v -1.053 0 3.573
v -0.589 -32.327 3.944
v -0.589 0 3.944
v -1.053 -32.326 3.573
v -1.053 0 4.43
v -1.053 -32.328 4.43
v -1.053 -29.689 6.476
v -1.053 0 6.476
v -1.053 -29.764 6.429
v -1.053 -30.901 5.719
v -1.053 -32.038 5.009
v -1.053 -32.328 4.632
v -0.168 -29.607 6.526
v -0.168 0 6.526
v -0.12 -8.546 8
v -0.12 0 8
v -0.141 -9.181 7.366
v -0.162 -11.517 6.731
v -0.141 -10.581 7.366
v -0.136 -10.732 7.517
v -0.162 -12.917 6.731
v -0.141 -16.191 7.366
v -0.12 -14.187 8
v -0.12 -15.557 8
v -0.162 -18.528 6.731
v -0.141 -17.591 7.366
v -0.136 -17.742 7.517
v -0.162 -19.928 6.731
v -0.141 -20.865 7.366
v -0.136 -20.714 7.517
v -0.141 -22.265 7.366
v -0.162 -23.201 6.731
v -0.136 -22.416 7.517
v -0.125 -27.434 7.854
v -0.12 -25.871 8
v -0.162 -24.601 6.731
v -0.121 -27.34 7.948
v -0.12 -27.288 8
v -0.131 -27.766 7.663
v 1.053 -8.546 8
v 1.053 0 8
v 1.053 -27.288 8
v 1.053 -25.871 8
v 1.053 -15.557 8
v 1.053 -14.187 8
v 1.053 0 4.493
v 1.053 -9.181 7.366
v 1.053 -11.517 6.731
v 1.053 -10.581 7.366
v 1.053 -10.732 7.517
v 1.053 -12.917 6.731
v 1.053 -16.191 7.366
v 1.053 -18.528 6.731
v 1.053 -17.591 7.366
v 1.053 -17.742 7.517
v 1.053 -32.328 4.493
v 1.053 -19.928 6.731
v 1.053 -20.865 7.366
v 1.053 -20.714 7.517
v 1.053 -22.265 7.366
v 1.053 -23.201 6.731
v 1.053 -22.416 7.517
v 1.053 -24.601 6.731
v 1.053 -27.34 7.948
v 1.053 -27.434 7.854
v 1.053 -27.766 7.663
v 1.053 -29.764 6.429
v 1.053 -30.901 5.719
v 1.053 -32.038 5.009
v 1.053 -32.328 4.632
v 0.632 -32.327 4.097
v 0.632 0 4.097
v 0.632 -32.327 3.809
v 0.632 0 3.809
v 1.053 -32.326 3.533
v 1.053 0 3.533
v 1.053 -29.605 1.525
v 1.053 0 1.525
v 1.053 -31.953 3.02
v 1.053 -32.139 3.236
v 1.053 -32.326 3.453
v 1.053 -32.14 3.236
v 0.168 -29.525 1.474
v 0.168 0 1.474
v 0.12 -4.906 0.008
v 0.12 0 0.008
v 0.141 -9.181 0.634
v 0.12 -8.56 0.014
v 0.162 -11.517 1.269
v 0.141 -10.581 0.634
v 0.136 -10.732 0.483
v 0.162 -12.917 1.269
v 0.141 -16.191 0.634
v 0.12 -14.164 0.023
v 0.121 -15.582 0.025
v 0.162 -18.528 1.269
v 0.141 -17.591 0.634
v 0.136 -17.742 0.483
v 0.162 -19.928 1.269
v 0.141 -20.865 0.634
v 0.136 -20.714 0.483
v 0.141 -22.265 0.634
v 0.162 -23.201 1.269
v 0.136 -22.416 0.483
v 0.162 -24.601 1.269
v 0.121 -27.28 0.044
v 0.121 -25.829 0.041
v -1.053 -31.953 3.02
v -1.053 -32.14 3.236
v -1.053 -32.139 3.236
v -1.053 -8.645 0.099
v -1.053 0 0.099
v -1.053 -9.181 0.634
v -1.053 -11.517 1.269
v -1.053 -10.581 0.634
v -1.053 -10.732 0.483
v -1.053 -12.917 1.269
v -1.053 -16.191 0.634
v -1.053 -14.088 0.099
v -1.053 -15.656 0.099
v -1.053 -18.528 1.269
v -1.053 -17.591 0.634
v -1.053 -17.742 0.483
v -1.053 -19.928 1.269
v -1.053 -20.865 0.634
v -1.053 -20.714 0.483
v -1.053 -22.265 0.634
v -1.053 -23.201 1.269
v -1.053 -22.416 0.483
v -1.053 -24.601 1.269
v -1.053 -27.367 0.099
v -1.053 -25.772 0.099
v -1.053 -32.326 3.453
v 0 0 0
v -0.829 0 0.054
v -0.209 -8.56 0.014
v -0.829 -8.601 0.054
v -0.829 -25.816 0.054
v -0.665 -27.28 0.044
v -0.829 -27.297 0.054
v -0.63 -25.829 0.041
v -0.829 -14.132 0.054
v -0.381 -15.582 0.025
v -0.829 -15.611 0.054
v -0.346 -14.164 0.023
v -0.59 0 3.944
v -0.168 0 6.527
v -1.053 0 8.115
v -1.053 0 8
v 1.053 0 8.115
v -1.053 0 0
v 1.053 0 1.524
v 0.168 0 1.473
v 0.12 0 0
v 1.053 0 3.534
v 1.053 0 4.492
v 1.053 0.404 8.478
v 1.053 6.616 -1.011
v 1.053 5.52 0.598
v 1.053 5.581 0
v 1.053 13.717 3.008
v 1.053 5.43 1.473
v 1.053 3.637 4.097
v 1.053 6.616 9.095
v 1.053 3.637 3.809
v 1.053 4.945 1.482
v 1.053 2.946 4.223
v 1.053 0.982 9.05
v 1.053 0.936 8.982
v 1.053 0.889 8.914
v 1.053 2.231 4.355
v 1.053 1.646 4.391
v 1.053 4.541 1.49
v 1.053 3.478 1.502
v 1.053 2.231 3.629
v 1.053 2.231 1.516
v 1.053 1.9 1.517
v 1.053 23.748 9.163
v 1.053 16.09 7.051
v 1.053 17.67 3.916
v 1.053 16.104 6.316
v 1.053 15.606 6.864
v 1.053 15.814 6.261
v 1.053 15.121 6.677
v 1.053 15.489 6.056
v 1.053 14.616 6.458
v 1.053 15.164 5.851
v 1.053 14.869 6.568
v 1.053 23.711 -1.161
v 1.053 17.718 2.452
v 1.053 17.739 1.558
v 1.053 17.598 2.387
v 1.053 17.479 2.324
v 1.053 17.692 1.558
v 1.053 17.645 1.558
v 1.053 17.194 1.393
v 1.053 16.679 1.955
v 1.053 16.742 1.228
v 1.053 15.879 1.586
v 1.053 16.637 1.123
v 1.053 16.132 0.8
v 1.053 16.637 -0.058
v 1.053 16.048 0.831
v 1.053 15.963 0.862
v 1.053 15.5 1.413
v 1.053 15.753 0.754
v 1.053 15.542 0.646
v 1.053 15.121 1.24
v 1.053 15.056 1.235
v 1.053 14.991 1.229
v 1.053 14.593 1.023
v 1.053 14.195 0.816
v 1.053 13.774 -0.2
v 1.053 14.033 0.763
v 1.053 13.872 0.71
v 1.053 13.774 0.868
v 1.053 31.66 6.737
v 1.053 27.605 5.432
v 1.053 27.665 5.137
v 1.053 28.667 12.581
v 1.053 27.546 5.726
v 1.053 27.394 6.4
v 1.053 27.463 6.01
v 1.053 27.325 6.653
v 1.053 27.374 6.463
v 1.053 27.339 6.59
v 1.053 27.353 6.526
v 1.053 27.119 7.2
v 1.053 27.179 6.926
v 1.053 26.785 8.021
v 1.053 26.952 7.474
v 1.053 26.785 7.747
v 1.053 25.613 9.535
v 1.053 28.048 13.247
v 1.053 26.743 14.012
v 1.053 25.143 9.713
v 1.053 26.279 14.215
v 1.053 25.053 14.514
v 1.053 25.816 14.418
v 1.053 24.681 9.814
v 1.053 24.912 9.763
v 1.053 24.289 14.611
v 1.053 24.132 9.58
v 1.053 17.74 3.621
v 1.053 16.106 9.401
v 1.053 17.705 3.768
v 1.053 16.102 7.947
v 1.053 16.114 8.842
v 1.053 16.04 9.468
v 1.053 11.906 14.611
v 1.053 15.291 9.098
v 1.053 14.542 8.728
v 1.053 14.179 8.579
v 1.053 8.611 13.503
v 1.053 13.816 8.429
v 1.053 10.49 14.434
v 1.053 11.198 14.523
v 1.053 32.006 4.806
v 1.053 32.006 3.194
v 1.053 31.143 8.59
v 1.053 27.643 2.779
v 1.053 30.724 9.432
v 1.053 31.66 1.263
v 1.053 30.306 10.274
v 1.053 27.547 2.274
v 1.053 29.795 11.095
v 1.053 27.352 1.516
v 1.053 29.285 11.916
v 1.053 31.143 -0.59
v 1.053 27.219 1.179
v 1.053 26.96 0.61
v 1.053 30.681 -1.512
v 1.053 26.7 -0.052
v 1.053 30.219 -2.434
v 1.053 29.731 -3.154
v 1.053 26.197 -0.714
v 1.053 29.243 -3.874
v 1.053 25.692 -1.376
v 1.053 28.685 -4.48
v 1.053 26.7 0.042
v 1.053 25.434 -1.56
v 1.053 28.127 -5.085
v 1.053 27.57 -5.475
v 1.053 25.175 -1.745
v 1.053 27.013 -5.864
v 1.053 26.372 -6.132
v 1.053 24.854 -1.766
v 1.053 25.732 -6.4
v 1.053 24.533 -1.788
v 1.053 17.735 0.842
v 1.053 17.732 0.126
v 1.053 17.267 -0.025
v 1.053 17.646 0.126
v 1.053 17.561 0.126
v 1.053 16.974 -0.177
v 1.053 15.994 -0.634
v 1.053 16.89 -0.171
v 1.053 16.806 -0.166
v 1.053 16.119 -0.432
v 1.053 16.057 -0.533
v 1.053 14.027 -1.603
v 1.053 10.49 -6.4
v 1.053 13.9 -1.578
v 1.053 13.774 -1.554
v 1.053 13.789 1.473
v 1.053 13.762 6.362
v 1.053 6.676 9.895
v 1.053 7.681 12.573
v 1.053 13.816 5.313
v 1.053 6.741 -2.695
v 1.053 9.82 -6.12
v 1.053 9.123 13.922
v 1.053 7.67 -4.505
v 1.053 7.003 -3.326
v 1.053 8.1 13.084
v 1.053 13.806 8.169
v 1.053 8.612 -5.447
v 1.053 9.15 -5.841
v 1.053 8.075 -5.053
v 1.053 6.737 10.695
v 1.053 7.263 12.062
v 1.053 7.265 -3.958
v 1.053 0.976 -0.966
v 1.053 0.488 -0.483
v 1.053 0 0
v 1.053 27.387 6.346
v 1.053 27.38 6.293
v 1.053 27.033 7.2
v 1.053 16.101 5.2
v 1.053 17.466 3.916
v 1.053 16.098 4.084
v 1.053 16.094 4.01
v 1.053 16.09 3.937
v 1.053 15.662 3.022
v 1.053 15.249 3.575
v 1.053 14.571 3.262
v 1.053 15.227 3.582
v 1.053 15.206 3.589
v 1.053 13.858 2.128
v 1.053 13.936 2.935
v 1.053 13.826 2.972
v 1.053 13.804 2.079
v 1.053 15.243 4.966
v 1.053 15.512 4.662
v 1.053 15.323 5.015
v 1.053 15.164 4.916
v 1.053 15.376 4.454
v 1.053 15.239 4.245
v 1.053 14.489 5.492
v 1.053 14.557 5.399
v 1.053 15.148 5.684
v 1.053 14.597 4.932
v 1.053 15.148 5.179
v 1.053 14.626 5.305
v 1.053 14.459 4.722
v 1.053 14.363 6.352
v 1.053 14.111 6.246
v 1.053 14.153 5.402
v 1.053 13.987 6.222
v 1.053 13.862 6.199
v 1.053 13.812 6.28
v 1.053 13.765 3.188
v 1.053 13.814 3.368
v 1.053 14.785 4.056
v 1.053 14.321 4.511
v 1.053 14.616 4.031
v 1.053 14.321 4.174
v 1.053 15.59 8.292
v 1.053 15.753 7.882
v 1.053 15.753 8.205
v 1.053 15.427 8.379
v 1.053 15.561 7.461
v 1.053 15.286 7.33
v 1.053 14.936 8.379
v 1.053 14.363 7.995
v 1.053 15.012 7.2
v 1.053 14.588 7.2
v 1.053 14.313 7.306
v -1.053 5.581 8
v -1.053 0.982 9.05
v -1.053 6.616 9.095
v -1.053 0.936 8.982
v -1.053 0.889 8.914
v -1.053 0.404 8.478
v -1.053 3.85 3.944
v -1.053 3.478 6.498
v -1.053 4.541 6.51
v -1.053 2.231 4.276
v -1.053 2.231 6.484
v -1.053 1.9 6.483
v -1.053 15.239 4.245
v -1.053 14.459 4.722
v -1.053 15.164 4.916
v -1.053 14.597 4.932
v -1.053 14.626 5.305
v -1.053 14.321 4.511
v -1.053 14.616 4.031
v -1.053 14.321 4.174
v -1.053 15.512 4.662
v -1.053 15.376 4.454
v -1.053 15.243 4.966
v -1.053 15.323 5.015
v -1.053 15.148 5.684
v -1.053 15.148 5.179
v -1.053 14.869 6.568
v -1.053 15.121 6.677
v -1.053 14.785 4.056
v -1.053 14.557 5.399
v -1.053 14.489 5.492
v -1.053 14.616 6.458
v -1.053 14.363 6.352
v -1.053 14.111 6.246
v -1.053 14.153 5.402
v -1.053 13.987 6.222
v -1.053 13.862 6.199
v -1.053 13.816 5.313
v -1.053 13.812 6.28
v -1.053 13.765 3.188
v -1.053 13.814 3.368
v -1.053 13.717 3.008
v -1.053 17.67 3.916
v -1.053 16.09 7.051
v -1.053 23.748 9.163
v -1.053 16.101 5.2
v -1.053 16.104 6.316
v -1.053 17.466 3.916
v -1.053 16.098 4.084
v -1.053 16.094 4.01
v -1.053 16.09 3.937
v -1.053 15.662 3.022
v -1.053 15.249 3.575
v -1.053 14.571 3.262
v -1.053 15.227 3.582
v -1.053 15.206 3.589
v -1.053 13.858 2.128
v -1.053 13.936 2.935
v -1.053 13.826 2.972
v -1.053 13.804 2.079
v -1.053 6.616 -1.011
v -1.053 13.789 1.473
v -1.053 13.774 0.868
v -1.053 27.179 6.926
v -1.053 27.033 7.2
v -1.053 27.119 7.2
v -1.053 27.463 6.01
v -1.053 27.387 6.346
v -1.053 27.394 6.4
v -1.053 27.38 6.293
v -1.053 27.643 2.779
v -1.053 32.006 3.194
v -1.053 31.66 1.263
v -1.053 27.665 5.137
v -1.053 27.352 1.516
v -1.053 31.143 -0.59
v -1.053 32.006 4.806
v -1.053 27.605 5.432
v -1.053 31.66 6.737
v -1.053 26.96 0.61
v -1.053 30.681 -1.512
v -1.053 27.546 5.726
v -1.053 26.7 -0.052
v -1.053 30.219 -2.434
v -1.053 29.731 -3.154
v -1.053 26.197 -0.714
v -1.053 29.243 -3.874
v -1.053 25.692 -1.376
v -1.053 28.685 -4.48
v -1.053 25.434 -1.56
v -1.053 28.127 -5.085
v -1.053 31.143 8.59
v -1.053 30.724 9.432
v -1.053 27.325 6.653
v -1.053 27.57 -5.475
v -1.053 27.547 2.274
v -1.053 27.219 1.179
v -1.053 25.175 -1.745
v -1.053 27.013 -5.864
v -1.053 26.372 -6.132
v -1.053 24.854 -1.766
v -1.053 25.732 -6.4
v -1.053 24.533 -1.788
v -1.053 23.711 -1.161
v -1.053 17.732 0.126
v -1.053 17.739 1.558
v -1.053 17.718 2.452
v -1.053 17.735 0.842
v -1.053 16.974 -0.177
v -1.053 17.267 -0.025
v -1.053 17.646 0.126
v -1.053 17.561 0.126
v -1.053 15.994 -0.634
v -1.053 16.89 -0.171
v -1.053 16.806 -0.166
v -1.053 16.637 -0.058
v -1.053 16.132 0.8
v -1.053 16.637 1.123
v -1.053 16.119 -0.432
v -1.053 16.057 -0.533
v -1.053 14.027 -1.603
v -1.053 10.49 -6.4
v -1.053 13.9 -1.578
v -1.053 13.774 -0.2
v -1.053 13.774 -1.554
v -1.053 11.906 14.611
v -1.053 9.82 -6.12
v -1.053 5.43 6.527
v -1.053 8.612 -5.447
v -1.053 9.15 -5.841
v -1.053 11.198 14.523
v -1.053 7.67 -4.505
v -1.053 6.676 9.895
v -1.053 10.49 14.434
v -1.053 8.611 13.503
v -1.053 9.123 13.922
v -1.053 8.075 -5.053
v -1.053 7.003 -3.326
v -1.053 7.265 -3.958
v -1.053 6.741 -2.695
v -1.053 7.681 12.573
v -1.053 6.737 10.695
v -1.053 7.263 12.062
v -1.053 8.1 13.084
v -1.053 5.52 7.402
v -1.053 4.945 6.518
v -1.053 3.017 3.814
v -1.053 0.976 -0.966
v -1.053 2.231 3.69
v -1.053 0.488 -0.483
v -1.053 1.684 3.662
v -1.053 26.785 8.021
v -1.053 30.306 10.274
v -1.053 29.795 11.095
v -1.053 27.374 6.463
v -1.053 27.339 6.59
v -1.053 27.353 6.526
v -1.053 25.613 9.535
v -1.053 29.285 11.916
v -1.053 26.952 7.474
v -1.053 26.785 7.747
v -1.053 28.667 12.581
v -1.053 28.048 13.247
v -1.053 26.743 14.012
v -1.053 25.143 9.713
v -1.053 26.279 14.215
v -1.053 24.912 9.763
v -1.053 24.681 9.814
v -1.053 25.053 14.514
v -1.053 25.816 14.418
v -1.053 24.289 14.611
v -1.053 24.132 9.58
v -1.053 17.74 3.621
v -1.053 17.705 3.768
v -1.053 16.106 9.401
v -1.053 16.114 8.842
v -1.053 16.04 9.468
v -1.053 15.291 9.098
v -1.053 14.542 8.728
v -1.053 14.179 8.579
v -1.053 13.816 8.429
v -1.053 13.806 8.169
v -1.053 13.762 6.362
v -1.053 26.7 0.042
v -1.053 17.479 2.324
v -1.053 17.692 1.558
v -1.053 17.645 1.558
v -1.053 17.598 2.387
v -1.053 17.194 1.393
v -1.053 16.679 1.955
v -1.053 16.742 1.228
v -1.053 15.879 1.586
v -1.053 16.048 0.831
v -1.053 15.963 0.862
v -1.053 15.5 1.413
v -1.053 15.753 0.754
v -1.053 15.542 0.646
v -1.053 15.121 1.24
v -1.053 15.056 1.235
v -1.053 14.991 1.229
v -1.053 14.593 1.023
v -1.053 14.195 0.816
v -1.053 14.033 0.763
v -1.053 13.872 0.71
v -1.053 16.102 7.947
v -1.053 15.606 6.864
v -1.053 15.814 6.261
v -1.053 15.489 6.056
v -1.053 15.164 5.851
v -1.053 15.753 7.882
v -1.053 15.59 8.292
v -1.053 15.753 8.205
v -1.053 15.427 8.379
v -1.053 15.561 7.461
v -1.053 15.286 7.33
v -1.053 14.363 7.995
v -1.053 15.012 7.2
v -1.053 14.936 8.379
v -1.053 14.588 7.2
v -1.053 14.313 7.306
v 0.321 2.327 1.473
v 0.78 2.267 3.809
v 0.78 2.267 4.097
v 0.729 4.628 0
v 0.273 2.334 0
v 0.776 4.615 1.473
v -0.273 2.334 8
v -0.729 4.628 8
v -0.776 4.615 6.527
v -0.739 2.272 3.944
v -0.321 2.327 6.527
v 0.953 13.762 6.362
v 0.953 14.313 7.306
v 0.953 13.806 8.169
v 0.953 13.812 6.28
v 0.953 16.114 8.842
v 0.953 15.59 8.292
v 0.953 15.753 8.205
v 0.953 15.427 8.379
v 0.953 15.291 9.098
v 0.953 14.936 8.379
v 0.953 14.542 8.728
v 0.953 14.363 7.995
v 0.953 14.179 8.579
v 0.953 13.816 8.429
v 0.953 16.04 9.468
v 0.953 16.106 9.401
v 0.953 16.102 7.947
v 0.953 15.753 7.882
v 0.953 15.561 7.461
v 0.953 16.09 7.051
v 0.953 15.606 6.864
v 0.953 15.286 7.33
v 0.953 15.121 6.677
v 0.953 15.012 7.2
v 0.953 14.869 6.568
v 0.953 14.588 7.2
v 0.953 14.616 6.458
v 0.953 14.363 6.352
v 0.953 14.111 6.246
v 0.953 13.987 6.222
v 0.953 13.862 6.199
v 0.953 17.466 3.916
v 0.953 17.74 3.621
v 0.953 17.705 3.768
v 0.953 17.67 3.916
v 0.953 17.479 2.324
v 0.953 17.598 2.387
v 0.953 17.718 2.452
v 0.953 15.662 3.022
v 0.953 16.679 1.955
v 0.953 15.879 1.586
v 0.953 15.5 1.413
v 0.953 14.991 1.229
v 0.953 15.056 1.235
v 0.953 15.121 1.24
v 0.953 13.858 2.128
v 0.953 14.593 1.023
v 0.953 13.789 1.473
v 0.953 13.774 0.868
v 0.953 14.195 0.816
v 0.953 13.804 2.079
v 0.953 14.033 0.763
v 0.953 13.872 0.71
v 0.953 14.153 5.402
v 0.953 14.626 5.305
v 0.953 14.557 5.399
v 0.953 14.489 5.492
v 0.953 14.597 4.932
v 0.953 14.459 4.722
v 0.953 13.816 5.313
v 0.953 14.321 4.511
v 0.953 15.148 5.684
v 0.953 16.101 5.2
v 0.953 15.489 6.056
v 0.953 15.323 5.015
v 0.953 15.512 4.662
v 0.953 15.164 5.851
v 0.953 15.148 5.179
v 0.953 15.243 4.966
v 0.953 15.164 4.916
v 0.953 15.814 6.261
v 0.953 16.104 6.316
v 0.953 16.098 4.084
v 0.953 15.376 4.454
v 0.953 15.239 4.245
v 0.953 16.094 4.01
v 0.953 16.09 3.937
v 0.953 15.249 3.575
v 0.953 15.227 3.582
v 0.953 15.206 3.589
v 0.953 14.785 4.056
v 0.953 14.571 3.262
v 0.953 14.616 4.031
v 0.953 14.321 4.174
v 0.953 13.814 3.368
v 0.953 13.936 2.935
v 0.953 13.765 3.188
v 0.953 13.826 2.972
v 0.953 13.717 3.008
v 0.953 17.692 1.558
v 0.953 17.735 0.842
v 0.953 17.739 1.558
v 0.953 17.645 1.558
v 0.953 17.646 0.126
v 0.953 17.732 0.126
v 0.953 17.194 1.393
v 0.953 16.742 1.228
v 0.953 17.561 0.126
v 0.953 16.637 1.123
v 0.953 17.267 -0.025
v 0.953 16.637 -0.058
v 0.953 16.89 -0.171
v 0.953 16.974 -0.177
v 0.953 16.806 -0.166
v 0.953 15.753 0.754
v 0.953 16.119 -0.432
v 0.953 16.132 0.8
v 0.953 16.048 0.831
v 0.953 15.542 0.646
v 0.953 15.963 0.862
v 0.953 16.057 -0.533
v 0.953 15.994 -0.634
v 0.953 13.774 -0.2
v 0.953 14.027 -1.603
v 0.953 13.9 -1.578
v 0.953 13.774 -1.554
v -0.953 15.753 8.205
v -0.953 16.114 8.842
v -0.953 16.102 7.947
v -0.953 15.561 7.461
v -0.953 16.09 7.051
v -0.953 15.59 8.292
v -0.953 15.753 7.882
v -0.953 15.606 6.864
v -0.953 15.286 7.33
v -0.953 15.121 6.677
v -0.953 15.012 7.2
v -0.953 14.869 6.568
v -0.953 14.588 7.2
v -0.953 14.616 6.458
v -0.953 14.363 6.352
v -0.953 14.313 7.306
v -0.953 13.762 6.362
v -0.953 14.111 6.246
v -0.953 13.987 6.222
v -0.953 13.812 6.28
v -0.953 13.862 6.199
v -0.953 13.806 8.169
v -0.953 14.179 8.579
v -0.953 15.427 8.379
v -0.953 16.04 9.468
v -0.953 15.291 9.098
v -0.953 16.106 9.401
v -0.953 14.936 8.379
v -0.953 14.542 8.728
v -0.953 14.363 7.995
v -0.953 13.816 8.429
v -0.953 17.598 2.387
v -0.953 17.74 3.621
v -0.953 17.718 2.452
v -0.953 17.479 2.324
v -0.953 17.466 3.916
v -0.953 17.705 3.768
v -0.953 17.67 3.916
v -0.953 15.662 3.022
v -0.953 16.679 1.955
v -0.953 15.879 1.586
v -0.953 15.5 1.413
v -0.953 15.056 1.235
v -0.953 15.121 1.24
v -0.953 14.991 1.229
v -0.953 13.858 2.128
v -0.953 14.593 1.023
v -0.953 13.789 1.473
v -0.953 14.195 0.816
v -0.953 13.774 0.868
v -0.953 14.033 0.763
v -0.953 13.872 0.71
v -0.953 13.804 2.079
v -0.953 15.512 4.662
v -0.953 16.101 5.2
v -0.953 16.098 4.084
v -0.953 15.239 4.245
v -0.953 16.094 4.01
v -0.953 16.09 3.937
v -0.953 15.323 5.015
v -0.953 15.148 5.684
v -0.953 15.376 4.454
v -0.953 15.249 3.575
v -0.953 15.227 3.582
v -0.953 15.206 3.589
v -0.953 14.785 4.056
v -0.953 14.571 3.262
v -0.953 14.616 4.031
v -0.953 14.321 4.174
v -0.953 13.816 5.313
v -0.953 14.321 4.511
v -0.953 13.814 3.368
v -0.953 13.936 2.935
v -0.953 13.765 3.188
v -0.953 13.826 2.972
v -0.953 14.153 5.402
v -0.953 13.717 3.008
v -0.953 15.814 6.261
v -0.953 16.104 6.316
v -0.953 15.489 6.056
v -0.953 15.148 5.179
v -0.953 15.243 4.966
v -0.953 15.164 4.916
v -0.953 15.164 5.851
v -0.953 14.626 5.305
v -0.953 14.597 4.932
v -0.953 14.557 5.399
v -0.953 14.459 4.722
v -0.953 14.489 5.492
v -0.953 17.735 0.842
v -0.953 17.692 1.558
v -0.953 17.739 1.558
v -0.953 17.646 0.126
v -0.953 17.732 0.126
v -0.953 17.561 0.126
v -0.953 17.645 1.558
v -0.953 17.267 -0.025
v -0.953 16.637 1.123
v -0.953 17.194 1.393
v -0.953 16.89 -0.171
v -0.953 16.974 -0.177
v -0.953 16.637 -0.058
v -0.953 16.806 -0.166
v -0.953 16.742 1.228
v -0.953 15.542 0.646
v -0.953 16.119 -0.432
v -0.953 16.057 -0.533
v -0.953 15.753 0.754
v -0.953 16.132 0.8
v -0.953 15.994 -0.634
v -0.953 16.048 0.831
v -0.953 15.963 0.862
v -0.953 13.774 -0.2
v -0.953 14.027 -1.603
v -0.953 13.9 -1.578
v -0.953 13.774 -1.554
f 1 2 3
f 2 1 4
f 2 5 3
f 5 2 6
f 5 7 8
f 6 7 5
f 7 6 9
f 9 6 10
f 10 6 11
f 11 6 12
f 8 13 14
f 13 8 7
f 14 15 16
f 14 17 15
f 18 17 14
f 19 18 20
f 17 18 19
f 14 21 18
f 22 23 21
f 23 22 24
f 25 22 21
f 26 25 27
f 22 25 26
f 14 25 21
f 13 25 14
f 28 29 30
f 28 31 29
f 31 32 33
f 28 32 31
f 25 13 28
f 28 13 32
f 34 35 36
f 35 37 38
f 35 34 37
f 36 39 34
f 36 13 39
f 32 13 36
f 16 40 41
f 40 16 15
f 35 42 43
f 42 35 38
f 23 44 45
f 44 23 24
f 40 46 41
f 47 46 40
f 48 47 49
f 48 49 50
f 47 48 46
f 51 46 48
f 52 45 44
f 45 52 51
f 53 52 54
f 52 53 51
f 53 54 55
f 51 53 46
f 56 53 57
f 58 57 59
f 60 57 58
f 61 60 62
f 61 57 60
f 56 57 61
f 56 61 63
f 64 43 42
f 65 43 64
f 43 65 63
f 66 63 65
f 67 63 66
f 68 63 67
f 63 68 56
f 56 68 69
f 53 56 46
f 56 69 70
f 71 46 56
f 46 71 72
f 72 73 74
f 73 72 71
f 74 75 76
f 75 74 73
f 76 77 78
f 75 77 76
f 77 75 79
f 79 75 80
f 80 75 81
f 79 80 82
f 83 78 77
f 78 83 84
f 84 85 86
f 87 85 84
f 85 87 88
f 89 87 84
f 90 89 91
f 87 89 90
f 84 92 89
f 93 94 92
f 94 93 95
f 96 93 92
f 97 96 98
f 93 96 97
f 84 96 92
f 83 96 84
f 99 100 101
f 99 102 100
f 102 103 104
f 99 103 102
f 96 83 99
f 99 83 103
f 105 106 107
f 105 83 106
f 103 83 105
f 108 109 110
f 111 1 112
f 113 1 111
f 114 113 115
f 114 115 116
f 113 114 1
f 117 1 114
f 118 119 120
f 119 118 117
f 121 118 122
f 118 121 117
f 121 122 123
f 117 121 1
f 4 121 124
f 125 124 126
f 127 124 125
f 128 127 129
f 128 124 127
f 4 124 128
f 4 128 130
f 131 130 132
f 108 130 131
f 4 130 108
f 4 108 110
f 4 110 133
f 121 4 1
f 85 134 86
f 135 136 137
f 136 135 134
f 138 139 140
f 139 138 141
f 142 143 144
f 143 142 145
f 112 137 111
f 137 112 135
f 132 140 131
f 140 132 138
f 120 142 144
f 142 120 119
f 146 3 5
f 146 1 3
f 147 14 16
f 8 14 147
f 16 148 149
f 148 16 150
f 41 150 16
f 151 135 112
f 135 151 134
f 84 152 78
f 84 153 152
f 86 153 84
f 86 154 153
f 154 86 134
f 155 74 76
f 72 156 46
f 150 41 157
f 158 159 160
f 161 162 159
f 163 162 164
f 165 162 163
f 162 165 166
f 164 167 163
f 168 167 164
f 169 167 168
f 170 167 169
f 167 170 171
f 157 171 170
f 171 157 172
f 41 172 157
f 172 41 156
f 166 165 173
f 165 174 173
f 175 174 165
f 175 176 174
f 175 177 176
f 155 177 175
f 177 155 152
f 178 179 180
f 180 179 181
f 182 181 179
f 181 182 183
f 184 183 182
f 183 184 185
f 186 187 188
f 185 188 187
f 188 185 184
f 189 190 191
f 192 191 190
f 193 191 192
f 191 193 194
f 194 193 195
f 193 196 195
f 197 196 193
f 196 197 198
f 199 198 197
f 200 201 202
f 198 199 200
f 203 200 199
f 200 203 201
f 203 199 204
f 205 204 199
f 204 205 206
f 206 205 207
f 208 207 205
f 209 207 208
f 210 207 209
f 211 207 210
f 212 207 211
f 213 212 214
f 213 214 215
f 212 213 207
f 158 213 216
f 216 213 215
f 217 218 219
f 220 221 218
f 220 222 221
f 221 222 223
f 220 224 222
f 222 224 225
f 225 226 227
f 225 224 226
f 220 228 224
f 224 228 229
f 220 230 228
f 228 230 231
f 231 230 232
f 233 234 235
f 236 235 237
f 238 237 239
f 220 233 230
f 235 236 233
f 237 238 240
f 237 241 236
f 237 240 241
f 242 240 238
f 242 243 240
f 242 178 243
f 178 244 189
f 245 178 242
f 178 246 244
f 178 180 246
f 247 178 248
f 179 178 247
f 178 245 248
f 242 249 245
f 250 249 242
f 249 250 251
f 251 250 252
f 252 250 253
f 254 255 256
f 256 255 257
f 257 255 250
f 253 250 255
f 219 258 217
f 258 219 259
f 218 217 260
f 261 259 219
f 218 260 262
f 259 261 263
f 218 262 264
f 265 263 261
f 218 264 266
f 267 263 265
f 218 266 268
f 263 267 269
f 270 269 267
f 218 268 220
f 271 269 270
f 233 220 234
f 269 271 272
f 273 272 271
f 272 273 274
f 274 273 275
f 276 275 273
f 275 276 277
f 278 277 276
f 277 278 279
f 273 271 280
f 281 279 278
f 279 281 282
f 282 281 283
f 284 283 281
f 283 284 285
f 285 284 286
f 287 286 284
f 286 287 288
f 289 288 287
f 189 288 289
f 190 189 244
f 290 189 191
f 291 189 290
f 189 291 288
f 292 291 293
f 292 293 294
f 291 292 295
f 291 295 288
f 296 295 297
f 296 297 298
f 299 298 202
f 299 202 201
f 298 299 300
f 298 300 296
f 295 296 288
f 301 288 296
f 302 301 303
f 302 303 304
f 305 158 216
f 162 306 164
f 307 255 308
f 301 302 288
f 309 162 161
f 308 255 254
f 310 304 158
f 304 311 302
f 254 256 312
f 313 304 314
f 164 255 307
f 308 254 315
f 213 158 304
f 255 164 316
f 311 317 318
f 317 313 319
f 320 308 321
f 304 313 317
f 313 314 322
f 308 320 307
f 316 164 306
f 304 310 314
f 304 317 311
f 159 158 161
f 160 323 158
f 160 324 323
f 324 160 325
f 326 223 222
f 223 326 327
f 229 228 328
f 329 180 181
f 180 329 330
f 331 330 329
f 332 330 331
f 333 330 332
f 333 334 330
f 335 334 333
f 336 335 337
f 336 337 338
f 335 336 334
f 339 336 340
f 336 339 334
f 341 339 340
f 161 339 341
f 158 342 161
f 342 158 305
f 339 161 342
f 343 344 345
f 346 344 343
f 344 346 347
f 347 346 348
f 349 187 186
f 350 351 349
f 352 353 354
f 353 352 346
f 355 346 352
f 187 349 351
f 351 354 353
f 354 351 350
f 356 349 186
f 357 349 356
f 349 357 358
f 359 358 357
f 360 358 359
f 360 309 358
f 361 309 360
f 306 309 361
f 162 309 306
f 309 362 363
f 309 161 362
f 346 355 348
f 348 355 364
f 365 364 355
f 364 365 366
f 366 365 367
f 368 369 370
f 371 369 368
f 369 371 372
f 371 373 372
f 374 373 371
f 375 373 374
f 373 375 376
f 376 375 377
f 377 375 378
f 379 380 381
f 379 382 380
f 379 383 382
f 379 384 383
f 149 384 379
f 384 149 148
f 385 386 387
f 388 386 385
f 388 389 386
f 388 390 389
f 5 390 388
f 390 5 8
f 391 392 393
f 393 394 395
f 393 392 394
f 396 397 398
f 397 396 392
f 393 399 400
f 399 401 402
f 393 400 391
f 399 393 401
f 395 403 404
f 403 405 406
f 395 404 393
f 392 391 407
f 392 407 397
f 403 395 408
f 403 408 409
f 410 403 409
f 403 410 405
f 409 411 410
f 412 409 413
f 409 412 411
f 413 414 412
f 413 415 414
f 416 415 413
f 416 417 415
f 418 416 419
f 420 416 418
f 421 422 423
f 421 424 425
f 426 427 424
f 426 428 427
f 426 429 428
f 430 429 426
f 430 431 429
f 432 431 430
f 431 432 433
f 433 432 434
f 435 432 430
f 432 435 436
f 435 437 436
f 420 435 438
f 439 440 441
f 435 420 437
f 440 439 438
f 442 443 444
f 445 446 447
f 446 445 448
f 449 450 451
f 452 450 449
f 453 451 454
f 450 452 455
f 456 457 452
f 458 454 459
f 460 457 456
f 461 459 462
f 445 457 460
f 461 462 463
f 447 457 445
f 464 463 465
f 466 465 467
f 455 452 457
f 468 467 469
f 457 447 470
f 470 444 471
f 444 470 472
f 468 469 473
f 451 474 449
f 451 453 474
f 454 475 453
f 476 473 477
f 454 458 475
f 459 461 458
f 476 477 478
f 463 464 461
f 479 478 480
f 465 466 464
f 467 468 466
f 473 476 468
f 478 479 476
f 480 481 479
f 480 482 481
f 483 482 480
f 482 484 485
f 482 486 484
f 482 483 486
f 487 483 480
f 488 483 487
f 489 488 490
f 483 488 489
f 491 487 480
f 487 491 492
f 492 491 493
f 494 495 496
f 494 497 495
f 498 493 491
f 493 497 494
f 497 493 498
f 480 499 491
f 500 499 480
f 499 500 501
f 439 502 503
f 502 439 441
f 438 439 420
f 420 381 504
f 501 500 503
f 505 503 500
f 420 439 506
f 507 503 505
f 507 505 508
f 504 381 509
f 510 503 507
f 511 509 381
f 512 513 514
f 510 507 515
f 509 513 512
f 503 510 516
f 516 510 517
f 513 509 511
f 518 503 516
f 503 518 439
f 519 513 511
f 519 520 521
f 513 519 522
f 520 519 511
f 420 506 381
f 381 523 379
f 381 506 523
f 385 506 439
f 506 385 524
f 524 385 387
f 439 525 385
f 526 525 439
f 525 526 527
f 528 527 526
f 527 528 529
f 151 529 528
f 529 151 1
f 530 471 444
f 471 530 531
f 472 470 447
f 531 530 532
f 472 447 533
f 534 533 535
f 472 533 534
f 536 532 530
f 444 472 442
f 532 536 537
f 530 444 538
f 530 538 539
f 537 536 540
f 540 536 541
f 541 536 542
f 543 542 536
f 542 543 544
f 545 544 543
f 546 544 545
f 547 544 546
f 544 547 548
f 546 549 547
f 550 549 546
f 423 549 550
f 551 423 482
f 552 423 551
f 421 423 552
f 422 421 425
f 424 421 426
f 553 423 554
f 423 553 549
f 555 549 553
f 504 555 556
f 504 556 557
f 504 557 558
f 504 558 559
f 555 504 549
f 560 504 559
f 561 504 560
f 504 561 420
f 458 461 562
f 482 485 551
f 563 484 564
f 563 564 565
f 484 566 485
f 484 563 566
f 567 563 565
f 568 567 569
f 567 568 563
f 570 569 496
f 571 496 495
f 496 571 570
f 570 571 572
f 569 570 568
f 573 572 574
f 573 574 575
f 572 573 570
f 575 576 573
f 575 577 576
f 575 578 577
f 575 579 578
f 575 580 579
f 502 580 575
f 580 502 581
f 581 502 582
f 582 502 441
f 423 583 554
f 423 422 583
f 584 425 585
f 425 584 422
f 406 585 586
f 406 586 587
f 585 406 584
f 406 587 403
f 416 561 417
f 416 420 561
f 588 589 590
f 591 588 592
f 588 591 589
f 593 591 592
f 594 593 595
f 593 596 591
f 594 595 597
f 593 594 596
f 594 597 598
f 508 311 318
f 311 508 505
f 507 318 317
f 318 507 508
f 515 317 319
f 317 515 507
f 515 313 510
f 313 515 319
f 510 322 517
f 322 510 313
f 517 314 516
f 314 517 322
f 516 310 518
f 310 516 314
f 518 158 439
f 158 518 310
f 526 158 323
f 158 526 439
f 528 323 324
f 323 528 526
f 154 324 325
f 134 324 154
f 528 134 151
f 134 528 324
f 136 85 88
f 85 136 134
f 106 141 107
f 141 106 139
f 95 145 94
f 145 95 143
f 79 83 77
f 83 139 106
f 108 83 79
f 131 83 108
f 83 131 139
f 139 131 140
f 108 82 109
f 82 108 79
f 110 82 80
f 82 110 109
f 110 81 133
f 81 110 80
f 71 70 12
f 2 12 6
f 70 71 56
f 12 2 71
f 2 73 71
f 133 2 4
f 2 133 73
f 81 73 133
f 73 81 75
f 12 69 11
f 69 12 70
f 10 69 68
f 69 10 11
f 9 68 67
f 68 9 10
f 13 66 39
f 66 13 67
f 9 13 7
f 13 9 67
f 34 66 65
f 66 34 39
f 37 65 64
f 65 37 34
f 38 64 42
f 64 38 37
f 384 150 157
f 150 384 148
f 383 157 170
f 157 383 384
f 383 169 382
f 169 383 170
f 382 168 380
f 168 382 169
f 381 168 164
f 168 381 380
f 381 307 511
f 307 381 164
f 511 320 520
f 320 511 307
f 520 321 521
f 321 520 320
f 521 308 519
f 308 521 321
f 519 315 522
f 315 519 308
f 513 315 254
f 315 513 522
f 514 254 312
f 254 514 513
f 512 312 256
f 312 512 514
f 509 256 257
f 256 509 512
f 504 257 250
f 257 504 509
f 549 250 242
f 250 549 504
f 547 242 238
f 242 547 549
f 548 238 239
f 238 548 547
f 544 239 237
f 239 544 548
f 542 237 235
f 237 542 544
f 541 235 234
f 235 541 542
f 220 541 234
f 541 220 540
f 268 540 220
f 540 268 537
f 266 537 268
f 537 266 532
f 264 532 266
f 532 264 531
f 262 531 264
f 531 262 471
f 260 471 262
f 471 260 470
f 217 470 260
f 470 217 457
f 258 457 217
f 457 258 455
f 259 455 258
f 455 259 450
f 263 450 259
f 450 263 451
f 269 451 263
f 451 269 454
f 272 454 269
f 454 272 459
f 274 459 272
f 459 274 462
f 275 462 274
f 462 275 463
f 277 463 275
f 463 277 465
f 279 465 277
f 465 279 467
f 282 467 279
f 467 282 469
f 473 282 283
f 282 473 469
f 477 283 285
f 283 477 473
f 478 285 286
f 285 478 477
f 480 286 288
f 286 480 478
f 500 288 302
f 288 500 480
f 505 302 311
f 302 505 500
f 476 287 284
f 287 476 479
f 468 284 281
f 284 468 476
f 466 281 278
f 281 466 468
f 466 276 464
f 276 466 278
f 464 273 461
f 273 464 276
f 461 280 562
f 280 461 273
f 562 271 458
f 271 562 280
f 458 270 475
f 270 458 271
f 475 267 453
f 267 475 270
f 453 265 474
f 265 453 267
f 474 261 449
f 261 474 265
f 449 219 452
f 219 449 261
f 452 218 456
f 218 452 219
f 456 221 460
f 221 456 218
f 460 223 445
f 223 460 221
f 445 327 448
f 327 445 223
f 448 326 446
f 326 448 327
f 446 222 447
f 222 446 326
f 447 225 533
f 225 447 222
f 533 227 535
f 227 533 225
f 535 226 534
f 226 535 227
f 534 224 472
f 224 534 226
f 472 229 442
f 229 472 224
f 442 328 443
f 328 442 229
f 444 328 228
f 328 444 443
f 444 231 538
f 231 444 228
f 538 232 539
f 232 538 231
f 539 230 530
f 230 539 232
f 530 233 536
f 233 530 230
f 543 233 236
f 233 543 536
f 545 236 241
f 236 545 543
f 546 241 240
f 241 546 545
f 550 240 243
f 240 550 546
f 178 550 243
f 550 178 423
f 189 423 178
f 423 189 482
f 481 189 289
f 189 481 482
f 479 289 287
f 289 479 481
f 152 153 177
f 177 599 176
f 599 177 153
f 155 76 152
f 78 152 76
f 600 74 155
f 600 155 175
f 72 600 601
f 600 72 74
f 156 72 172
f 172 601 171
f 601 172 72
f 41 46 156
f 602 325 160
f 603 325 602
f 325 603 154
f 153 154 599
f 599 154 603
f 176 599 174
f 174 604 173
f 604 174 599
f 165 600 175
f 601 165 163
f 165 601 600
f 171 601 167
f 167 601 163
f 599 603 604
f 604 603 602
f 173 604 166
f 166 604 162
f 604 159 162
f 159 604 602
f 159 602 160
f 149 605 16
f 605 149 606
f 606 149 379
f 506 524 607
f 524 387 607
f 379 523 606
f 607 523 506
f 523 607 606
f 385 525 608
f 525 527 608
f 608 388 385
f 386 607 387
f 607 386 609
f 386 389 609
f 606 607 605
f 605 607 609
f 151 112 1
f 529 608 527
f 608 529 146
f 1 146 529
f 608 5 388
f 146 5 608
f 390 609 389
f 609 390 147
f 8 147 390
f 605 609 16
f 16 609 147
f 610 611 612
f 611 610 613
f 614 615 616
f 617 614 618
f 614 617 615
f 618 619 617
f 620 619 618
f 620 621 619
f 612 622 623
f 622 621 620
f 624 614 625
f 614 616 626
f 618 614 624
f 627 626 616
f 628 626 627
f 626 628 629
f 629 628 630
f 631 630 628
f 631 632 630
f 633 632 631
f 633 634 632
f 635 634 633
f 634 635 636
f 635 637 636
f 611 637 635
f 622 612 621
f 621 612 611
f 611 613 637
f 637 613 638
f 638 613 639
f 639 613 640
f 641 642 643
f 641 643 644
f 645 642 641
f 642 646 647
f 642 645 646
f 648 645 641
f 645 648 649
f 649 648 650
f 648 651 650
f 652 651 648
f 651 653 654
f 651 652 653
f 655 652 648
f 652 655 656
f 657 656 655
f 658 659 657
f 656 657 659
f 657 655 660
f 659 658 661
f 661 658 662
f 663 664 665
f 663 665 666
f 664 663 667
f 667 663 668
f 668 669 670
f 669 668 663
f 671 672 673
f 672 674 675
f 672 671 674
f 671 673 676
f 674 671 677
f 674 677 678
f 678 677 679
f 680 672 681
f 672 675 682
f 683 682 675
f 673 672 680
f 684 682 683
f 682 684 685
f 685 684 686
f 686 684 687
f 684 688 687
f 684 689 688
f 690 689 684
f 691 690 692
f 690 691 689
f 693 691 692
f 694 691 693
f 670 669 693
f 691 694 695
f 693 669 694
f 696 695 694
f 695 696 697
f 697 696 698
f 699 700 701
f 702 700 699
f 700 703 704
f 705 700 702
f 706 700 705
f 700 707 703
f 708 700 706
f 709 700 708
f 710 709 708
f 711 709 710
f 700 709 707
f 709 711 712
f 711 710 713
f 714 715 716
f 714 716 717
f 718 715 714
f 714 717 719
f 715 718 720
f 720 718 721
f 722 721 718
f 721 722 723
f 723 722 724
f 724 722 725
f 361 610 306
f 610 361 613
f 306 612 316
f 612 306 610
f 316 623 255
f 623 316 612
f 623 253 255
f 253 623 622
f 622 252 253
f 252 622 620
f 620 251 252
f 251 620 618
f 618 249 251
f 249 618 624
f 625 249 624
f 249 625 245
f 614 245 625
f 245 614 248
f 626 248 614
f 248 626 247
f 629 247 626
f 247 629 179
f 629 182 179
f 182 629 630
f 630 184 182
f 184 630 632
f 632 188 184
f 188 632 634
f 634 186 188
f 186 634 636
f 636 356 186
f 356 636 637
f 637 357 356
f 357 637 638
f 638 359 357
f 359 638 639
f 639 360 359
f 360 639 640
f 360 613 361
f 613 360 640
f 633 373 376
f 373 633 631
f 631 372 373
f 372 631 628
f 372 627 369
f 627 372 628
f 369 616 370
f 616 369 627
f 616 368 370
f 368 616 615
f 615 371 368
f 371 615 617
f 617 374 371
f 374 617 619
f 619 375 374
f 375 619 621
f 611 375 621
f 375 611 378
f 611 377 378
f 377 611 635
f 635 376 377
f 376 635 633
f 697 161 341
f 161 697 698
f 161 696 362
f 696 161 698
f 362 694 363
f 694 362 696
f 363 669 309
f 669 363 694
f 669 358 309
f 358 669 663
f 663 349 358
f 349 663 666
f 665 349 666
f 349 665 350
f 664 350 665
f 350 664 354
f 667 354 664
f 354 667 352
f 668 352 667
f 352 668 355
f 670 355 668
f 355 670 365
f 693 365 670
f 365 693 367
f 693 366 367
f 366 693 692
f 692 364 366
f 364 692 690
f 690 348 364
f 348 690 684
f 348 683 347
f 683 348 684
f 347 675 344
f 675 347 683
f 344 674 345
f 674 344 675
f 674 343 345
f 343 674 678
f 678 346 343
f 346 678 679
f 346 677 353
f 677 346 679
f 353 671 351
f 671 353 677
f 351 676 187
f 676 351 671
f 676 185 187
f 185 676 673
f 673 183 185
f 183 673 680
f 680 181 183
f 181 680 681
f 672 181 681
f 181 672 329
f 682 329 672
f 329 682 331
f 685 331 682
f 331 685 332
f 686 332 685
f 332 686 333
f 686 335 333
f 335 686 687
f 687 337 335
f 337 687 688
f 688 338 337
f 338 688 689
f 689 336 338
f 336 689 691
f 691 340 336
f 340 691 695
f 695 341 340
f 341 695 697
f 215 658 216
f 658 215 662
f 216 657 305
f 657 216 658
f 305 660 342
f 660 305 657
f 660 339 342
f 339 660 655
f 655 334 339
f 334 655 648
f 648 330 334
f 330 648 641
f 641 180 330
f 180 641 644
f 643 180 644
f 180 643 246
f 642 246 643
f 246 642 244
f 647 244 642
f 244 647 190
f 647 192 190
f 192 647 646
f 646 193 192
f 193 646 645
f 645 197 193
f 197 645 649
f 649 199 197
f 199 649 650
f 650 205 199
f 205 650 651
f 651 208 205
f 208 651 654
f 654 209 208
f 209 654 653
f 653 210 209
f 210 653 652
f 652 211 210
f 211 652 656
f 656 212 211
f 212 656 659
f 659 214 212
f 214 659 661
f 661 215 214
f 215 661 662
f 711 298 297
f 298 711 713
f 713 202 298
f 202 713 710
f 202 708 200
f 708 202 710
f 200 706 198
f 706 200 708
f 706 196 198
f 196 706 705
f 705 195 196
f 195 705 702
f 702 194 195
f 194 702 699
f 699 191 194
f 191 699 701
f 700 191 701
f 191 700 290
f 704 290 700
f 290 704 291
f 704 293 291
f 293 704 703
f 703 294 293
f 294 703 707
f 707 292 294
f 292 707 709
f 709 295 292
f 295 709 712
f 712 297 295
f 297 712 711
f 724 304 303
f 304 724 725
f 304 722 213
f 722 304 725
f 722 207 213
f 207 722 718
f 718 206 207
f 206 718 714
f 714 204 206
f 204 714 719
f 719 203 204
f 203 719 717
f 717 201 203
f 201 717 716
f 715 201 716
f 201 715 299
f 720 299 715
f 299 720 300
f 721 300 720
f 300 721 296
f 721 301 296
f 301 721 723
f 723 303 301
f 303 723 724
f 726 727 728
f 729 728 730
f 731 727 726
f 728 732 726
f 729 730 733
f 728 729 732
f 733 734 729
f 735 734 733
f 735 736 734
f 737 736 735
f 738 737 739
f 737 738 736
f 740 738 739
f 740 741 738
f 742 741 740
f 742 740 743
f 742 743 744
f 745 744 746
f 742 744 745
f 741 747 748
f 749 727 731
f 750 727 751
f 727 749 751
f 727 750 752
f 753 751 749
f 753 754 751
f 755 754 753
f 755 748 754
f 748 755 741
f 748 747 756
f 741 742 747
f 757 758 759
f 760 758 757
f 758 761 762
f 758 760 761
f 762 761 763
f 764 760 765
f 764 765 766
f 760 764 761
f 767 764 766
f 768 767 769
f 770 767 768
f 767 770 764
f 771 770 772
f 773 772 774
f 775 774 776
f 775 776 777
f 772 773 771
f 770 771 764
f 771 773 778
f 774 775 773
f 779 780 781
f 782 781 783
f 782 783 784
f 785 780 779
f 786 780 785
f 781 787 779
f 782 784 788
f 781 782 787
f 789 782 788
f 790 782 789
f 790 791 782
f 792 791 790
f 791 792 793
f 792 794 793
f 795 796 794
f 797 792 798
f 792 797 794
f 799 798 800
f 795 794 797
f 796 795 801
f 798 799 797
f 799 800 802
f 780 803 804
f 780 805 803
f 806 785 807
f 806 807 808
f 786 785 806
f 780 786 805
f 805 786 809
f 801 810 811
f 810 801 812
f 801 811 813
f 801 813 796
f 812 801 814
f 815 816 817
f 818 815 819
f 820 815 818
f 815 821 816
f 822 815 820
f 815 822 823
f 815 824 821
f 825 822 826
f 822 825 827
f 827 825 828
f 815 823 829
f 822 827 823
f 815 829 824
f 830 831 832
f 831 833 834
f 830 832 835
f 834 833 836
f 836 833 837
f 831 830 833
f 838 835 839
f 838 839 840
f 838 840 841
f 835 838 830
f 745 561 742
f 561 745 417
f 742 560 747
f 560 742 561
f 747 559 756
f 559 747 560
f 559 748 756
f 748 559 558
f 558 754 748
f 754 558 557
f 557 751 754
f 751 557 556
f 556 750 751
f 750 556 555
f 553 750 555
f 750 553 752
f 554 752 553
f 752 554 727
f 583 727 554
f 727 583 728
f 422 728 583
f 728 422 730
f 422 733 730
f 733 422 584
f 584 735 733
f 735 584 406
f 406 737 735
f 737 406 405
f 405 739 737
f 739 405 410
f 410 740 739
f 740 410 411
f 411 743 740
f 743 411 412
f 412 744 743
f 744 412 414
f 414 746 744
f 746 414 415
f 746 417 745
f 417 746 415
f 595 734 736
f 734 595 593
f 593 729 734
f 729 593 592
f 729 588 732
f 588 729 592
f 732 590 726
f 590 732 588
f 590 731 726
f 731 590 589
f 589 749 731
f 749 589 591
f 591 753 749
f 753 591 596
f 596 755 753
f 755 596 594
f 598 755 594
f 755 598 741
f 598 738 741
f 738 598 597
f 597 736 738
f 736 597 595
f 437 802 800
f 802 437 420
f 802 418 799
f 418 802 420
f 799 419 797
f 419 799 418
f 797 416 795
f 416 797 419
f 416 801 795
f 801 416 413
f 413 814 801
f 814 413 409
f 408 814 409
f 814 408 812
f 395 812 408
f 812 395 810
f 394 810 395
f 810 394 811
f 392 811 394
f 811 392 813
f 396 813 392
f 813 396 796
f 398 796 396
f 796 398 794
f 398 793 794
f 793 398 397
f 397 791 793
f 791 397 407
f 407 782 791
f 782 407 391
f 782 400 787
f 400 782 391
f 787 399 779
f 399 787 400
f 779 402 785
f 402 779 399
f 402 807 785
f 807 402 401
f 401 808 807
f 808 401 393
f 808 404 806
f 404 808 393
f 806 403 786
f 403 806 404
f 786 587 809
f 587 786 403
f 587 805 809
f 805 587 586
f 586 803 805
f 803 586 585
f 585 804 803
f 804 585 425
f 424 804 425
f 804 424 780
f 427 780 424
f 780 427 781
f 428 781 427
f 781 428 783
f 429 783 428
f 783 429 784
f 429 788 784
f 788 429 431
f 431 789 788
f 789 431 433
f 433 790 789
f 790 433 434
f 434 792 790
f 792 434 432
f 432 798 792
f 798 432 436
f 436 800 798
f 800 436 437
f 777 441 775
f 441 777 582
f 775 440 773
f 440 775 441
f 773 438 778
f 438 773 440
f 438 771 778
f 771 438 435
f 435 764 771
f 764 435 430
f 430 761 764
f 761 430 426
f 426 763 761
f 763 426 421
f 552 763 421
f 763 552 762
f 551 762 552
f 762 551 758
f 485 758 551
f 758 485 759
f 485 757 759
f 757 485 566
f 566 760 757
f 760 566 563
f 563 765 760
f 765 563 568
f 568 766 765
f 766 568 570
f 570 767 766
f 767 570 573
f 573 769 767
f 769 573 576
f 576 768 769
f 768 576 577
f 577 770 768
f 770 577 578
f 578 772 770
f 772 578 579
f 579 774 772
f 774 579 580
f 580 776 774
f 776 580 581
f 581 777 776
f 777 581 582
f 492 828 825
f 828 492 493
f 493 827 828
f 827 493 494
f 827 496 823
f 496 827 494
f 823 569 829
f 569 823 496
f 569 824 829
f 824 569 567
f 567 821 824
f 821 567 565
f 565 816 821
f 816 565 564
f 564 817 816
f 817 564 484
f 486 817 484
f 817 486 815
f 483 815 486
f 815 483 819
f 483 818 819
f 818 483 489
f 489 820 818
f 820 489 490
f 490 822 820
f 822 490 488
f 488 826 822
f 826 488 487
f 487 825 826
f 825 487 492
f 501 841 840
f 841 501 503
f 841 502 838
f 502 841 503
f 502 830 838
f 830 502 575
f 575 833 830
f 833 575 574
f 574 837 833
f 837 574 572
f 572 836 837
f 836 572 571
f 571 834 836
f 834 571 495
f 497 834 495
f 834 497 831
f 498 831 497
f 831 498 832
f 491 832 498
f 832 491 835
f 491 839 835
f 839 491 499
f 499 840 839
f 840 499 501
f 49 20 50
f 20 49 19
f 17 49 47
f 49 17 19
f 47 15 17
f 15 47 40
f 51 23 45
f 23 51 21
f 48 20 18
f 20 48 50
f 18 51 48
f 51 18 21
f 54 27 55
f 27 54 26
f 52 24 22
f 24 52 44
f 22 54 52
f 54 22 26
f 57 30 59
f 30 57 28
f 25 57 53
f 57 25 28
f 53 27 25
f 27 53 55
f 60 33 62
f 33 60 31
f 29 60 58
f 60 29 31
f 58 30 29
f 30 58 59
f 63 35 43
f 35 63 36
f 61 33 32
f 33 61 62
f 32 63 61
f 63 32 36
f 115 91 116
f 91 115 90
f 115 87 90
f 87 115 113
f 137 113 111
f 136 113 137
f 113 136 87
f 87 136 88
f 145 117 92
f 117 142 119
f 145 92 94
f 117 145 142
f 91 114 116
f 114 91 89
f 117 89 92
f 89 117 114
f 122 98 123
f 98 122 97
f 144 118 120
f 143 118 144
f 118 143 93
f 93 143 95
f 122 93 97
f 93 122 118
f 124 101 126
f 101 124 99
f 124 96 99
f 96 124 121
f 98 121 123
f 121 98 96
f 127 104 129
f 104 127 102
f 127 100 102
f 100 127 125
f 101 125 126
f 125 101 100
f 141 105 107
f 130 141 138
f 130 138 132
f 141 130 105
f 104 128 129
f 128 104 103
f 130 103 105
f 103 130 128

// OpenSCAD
use <keygen.scad>
include <B97-PT.gen.scad>

module B97_PT(bitting="",
               outline_name="B97-PT",
               warding_name="B97-PT",
               series_name="GM04") {

    name = "B97-PT";

     
    /*
        Bitting is specified from bow to tip, 0-4, with 0 being the shallowest cut and 1 being the deepest.
                   The 4th (5th?) entry in the depth table that seems way higher is the key I was trying to replicate seemed to skip the first cut location so I added that as a "Skip" value to use. 
        Example: 412221
                   
        This model is for a Kawasaki Key sometimes called a X103 or a KA14 I think
        I pulled the outline and such from the motorcycle guide I have added and the main 2 depth and cut location tables from the Framon Key depth guide (v8) 
    */
    outlines_k = ["B97-PT"];
    wardings_k = ["B97-PT"];
                   
    wardingHeight_min = min([for(e=warding_points) e[1]]);
    wardingHeight_max = max([for(e=warding_points) e[1]]);
    wardingHeight = wardingHeight_max-wardingHeight_min;

    offset = [-outline_points[30][0], -outline_points[30][1]];
    depth_table= 
        series_name=="GM04"  ? [for(i=[.315, .290, .265, .240]) i*25.4] :
        series_name=="5001-6000"? [for(i=[.260, .240, .220, .200, 20]) i*25.4] :
        series_name=="custom"   ? [for(i=[.245, .215, .220, .200, 20]) i*25.4] :[];
    cut_locations=
        series_name=="GM04"  ? [for(i=[.205, .297, .389, .481, .573, .665, .757, .849, .941, 1.033]) i*25.4] :
        series_name=="5001-6000"? [for(i=[.1, .2, .3, .4, .5, .6]) i*25.4] :
        series_name=="custom"   ? [for(i=[.1, .2, .3, .4, .5, .6]) i*25.4] :[];

    // Kwikset starts with 1??

    heights = key_code_to_heights(bitting, depth_table);

    difference() 
    {
        if($children == 0) {
            key_blank(outline_points,
                      warding_points,
                      outline_paths=outline_paths,
                      engrave_right_points=engrave_points,
                      engrave_right_paths=engrave_paths,
                      engrave_left_points=engrave_points,
                      engrave_left_paths=engrave_paths,
                      offset=offset,
                      plug_diameter=12.7);
        } else {
            children(0);
        }
        key_bitting(heights, cut_locations, 1.4, 90);
        //This is my attempt at adding double sidded cutting Hopefully it works for others.
        translate([0,0,wardingHeight]){ 
        rotate([0,180,0]){
            key_bitting(heights, cut_locations, 1.4, 90);
        }
        }
    }
}

// Defaults
//bitting="412221";
bitting ="0012012120";
outline="B97-PT";
warding="B97-PT";
series_name="GM04";
B97_PT(bitting, outline, warding, series_name);
